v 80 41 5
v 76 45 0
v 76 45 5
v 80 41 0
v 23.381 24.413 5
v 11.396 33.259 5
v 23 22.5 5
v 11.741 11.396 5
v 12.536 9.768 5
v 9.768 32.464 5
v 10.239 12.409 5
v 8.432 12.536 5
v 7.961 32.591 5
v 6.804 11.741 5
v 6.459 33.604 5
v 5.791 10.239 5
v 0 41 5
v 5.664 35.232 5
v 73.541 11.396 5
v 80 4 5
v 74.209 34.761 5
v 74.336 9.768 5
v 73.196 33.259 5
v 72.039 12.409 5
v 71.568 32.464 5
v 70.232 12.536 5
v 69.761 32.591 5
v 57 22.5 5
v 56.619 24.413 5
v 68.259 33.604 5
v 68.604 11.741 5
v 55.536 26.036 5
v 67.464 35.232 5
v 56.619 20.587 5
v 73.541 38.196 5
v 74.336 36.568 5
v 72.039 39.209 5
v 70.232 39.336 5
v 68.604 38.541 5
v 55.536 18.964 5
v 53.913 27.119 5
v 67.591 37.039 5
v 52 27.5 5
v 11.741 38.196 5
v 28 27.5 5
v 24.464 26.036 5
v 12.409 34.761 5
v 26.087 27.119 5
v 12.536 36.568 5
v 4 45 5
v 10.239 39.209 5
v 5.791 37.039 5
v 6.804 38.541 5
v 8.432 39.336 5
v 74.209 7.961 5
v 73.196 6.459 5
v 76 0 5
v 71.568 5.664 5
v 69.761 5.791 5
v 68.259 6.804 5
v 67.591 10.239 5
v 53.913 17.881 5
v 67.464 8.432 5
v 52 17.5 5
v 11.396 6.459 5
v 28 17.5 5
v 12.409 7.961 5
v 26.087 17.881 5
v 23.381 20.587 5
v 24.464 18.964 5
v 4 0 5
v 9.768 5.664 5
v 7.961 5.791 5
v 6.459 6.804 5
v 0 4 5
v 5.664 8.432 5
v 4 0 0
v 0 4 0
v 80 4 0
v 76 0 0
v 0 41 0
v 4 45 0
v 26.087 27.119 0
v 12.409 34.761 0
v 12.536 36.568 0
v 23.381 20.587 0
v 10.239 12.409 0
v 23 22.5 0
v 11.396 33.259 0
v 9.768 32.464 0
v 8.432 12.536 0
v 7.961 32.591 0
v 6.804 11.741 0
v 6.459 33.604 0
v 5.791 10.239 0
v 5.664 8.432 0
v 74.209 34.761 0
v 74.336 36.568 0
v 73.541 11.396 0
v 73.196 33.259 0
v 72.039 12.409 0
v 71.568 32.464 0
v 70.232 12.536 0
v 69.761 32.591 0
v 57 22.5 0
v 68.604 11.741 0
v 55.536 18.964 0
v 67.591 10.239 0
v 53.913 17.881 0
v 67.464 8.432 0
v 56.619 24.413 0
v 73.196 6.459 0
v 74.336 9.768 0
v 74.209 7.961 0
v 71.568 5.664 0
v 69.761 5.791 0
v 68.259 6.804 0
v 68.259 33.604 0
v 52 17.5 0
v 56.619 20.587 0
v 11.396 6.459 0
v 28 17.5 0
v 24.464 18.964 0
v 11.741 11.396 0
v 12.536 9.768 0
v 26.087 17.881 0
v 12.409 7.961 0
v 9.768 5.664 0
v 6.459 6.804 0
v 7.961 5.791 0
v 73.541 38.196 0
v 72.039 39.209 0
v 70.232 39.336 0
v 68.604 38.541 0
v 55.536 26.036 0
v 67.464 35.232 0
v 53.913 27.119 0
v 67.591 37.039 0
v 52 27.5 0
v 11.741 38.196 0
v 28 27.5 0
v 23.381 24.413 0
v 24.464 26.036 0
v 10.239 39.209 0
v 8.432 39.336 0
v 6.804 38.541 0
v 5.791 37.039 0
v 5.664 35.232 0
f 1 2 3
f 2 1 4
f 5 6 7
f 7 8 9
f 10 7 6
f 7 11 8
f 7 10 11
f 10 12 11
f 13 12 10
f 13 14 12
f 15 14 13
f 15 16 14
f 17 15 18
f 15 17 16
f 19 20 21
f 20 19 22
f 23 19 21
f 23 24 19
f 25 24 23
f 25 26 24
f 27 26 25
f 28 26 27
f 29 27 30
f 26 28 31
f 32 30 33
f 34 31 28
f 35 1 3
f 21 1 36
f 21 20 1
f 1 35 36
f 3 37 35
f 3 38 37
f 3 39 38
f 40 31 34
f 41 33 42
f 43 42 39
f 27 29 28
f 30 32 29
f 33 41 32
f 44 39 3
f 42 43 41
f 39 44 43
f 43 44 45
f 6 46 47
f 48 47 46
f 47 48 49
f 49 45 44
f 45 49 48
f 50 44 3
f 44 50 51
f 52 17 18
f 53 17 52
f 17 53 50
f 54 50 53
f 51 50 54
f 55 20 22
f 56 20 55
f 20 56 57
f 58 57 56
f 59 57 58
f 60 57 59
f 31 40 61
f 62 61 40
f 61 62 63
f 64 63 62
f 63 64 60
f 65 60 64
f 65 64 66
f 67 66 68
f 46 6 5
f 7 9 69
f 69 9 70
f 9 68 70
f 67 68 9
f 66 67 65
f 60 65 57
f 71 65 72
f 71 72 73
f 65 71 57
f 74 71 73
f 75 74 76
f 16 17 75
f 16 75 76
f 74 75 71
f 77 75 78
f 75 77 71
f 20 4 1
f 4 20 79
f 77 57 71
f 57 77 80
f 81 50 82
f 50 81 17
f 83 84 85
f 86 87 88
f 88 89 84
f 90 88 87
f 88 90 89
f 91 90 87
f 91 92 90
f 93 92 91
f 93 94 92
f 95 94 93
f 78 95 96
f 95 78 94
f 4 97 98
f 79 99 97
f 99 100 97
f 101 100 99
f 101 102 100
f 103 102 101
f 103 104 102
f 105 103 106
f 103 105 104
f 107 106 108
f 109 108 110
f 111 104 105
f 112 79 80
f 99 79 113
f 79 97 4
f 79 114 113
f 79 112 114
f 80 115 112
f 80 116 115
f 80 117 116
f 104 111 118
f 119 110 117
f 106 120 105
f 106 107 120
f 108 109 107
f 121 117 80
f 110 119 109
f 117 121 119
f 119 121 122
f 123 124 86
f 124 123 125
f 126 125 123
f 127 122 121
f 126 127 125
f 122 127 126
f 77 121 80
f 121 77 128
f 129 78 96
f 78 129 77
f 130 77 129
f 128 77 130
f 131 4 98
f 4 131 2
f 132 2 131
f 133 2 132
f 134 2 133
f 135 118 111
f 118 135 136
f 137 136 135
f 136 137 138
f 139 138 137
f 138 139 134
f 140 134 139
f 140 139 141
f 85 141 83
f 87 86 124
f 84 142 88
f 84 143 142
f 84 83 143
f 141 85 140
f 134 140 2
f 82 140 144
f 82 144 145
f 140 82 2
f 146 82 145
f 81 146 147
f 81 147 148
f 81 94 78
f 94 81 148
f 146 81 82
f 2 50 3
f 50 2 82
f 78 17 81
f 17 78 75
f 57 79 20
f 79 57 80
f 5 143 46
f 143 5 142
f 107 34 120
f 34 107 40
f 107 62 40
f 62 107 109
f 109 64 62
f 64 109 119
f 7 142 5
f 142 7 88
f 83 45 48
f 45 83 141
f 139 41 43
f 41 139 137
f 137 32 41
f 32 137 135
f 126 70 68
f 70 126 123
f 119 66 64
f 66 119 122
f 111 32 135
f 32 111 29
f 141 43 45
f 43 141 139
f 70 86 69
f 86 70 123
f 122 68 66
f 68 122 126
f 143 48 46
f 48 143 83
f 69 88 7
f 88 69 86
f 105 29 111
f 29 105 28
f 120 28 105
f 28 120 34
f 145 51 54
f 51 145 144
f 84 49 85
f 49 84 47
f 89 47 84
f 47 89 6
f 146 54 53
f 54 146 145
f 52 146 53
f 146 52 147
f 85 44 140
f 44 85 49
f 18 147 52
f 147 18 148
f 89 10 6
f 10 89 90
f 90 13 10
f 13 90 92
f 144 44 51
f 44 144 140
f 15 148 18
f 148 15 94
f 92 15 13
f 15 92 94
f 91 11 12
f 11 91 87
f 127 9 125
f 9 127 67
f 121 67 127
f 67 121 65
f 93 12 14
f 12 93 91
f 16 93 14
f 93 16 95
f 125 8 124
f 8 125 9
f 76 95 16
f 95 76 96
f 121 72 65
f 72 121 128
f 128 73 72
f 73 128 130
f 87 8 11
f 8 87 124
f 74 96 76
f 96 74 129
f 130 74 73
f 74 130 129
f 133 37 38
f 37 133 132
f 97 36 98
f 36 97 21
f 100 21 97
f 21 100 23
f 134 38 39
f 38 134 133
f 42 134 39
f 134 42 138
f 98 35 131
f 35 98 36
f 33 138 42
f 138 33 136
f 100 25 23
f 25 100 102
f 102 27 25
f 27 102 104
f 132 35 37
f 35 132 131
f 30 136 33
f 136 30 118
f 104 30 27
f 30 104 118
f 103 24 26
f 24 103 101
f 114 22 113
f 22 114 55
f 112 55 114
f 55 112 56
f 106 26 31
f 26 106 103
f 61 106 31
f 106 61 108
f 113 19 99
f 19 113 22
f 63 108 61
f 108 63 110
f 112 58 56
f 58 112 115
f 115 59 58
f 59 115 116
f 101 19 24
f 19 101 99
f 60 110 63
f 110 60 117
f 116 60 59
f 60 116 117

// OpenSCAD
$fn = 32;

// ----------------------------------------------------------------------
// Bracket plate: slot plate 80 x 45
// ----------------------------------------------------------------------

// --- parameters (mm) ---
hole_r = 3.5;             // bolt hole radius
plate_t = 5;              // plate thickness, Z (extrusion height)
plate_l = 80;             // plate length
plate_w = 45;             // plate width
slot_l = 24;              // slot straight length
slot_r = 5;               // slot end radius

slot_len = slot_l + 2 * slot_r;
slot_w = 2 * slot_r;
hole_d2 = 2 * hole_r;

profile = [[4, 0], [76, 0], [80, 4], [80, 41], [76, 45], [4, 45], [0, 41], [0, 4]];  // primary outline, 8 points, counter clockwise
void_1 = [[52, 17.5], [53.913, 17.881], [55.536, 18.964], [56.619, 20.587], [57, 22.5], [56.619, 24.413], [55.536, 26.036], [53.913, 27.119], [52, 27.5], [28, 27.5], [26.087, 27.119], [24.464, 26.036], [23.381, 24.413], [23, 22.5], [23.381, 20.587], [24.464, 18.964], [26.087, 17.881], [28, 17.5]];  // grip slot, 18 points
void_2 = [[12.536, 36.568], [11.741, 38.196], [10.239, 39.209], [8.432, 39.336], [6.804, 38.541], [5.791, 37.039], [5.664, 35.232], [6.459, 33.604], [7.961, 32.591], [9.768, 32.464], [11.396, 33.259], [12.409, 34.761]];  // corner hole, 12 points
void_3 = [[12.536, 9.768], [11.741, 11.396], [10.239, 12.409], [8.432, 12.536], [6.804, 11.741], [5.791, 10.239], [5.664, 8.432], [6.459, 6.804], [7.961, 5.791], [9.768, 5.664], [11.396, 6.459], [12.409, 7.961]];  // corner hole, 12 points
void_4 = [[74.336, 36.568], [73.541, 38.196], [72.039, 39.209], [70.232, 39.336], [68.604, 38.541], [67.591, 37.039], [67.464, 35.232], [68.259, 33.604], [69.761, 32.591], [71.568, 32.464], [73.196, 33.259], [74.209, 34.761]];  // corner hole, 12 points
void_5 = [[74.336, 9.768], [73.541, 11.396], [72.039, 12.409], [70.232, 12.536], [68.604, 11.741], [67.591, 10.239], [67.464, 8.432], [68.259, 6.804], [69.761, 5.791], [71.568, 5.664], [73.196, 6.459], [74.209, 7.961]];  // corner hole, 12 points

// --- the one profile operation ---
difference() {
  linear_extrude(height = plate_t) polygon(points = profile);
  translate([0, 0, -1])
    linear_extrude(height = plate_t + 2) polygon(points = void_1);
  translate([0, 0, -1])
    linear_extrude(height = plate_t + 2) polygon(points = void_2);
  translate([0, 0, -1])
    linear_extrude(height = plate_t + 2) polygon(points = void_3);
  translate([0, 0, -1])
    linear_extrude(height = plate_t + 2) polygon(points = void_4);
  translate([0, 0, -1])
    linear_extrude(height = plate_t + 2) polygon(points = void_5);
}
